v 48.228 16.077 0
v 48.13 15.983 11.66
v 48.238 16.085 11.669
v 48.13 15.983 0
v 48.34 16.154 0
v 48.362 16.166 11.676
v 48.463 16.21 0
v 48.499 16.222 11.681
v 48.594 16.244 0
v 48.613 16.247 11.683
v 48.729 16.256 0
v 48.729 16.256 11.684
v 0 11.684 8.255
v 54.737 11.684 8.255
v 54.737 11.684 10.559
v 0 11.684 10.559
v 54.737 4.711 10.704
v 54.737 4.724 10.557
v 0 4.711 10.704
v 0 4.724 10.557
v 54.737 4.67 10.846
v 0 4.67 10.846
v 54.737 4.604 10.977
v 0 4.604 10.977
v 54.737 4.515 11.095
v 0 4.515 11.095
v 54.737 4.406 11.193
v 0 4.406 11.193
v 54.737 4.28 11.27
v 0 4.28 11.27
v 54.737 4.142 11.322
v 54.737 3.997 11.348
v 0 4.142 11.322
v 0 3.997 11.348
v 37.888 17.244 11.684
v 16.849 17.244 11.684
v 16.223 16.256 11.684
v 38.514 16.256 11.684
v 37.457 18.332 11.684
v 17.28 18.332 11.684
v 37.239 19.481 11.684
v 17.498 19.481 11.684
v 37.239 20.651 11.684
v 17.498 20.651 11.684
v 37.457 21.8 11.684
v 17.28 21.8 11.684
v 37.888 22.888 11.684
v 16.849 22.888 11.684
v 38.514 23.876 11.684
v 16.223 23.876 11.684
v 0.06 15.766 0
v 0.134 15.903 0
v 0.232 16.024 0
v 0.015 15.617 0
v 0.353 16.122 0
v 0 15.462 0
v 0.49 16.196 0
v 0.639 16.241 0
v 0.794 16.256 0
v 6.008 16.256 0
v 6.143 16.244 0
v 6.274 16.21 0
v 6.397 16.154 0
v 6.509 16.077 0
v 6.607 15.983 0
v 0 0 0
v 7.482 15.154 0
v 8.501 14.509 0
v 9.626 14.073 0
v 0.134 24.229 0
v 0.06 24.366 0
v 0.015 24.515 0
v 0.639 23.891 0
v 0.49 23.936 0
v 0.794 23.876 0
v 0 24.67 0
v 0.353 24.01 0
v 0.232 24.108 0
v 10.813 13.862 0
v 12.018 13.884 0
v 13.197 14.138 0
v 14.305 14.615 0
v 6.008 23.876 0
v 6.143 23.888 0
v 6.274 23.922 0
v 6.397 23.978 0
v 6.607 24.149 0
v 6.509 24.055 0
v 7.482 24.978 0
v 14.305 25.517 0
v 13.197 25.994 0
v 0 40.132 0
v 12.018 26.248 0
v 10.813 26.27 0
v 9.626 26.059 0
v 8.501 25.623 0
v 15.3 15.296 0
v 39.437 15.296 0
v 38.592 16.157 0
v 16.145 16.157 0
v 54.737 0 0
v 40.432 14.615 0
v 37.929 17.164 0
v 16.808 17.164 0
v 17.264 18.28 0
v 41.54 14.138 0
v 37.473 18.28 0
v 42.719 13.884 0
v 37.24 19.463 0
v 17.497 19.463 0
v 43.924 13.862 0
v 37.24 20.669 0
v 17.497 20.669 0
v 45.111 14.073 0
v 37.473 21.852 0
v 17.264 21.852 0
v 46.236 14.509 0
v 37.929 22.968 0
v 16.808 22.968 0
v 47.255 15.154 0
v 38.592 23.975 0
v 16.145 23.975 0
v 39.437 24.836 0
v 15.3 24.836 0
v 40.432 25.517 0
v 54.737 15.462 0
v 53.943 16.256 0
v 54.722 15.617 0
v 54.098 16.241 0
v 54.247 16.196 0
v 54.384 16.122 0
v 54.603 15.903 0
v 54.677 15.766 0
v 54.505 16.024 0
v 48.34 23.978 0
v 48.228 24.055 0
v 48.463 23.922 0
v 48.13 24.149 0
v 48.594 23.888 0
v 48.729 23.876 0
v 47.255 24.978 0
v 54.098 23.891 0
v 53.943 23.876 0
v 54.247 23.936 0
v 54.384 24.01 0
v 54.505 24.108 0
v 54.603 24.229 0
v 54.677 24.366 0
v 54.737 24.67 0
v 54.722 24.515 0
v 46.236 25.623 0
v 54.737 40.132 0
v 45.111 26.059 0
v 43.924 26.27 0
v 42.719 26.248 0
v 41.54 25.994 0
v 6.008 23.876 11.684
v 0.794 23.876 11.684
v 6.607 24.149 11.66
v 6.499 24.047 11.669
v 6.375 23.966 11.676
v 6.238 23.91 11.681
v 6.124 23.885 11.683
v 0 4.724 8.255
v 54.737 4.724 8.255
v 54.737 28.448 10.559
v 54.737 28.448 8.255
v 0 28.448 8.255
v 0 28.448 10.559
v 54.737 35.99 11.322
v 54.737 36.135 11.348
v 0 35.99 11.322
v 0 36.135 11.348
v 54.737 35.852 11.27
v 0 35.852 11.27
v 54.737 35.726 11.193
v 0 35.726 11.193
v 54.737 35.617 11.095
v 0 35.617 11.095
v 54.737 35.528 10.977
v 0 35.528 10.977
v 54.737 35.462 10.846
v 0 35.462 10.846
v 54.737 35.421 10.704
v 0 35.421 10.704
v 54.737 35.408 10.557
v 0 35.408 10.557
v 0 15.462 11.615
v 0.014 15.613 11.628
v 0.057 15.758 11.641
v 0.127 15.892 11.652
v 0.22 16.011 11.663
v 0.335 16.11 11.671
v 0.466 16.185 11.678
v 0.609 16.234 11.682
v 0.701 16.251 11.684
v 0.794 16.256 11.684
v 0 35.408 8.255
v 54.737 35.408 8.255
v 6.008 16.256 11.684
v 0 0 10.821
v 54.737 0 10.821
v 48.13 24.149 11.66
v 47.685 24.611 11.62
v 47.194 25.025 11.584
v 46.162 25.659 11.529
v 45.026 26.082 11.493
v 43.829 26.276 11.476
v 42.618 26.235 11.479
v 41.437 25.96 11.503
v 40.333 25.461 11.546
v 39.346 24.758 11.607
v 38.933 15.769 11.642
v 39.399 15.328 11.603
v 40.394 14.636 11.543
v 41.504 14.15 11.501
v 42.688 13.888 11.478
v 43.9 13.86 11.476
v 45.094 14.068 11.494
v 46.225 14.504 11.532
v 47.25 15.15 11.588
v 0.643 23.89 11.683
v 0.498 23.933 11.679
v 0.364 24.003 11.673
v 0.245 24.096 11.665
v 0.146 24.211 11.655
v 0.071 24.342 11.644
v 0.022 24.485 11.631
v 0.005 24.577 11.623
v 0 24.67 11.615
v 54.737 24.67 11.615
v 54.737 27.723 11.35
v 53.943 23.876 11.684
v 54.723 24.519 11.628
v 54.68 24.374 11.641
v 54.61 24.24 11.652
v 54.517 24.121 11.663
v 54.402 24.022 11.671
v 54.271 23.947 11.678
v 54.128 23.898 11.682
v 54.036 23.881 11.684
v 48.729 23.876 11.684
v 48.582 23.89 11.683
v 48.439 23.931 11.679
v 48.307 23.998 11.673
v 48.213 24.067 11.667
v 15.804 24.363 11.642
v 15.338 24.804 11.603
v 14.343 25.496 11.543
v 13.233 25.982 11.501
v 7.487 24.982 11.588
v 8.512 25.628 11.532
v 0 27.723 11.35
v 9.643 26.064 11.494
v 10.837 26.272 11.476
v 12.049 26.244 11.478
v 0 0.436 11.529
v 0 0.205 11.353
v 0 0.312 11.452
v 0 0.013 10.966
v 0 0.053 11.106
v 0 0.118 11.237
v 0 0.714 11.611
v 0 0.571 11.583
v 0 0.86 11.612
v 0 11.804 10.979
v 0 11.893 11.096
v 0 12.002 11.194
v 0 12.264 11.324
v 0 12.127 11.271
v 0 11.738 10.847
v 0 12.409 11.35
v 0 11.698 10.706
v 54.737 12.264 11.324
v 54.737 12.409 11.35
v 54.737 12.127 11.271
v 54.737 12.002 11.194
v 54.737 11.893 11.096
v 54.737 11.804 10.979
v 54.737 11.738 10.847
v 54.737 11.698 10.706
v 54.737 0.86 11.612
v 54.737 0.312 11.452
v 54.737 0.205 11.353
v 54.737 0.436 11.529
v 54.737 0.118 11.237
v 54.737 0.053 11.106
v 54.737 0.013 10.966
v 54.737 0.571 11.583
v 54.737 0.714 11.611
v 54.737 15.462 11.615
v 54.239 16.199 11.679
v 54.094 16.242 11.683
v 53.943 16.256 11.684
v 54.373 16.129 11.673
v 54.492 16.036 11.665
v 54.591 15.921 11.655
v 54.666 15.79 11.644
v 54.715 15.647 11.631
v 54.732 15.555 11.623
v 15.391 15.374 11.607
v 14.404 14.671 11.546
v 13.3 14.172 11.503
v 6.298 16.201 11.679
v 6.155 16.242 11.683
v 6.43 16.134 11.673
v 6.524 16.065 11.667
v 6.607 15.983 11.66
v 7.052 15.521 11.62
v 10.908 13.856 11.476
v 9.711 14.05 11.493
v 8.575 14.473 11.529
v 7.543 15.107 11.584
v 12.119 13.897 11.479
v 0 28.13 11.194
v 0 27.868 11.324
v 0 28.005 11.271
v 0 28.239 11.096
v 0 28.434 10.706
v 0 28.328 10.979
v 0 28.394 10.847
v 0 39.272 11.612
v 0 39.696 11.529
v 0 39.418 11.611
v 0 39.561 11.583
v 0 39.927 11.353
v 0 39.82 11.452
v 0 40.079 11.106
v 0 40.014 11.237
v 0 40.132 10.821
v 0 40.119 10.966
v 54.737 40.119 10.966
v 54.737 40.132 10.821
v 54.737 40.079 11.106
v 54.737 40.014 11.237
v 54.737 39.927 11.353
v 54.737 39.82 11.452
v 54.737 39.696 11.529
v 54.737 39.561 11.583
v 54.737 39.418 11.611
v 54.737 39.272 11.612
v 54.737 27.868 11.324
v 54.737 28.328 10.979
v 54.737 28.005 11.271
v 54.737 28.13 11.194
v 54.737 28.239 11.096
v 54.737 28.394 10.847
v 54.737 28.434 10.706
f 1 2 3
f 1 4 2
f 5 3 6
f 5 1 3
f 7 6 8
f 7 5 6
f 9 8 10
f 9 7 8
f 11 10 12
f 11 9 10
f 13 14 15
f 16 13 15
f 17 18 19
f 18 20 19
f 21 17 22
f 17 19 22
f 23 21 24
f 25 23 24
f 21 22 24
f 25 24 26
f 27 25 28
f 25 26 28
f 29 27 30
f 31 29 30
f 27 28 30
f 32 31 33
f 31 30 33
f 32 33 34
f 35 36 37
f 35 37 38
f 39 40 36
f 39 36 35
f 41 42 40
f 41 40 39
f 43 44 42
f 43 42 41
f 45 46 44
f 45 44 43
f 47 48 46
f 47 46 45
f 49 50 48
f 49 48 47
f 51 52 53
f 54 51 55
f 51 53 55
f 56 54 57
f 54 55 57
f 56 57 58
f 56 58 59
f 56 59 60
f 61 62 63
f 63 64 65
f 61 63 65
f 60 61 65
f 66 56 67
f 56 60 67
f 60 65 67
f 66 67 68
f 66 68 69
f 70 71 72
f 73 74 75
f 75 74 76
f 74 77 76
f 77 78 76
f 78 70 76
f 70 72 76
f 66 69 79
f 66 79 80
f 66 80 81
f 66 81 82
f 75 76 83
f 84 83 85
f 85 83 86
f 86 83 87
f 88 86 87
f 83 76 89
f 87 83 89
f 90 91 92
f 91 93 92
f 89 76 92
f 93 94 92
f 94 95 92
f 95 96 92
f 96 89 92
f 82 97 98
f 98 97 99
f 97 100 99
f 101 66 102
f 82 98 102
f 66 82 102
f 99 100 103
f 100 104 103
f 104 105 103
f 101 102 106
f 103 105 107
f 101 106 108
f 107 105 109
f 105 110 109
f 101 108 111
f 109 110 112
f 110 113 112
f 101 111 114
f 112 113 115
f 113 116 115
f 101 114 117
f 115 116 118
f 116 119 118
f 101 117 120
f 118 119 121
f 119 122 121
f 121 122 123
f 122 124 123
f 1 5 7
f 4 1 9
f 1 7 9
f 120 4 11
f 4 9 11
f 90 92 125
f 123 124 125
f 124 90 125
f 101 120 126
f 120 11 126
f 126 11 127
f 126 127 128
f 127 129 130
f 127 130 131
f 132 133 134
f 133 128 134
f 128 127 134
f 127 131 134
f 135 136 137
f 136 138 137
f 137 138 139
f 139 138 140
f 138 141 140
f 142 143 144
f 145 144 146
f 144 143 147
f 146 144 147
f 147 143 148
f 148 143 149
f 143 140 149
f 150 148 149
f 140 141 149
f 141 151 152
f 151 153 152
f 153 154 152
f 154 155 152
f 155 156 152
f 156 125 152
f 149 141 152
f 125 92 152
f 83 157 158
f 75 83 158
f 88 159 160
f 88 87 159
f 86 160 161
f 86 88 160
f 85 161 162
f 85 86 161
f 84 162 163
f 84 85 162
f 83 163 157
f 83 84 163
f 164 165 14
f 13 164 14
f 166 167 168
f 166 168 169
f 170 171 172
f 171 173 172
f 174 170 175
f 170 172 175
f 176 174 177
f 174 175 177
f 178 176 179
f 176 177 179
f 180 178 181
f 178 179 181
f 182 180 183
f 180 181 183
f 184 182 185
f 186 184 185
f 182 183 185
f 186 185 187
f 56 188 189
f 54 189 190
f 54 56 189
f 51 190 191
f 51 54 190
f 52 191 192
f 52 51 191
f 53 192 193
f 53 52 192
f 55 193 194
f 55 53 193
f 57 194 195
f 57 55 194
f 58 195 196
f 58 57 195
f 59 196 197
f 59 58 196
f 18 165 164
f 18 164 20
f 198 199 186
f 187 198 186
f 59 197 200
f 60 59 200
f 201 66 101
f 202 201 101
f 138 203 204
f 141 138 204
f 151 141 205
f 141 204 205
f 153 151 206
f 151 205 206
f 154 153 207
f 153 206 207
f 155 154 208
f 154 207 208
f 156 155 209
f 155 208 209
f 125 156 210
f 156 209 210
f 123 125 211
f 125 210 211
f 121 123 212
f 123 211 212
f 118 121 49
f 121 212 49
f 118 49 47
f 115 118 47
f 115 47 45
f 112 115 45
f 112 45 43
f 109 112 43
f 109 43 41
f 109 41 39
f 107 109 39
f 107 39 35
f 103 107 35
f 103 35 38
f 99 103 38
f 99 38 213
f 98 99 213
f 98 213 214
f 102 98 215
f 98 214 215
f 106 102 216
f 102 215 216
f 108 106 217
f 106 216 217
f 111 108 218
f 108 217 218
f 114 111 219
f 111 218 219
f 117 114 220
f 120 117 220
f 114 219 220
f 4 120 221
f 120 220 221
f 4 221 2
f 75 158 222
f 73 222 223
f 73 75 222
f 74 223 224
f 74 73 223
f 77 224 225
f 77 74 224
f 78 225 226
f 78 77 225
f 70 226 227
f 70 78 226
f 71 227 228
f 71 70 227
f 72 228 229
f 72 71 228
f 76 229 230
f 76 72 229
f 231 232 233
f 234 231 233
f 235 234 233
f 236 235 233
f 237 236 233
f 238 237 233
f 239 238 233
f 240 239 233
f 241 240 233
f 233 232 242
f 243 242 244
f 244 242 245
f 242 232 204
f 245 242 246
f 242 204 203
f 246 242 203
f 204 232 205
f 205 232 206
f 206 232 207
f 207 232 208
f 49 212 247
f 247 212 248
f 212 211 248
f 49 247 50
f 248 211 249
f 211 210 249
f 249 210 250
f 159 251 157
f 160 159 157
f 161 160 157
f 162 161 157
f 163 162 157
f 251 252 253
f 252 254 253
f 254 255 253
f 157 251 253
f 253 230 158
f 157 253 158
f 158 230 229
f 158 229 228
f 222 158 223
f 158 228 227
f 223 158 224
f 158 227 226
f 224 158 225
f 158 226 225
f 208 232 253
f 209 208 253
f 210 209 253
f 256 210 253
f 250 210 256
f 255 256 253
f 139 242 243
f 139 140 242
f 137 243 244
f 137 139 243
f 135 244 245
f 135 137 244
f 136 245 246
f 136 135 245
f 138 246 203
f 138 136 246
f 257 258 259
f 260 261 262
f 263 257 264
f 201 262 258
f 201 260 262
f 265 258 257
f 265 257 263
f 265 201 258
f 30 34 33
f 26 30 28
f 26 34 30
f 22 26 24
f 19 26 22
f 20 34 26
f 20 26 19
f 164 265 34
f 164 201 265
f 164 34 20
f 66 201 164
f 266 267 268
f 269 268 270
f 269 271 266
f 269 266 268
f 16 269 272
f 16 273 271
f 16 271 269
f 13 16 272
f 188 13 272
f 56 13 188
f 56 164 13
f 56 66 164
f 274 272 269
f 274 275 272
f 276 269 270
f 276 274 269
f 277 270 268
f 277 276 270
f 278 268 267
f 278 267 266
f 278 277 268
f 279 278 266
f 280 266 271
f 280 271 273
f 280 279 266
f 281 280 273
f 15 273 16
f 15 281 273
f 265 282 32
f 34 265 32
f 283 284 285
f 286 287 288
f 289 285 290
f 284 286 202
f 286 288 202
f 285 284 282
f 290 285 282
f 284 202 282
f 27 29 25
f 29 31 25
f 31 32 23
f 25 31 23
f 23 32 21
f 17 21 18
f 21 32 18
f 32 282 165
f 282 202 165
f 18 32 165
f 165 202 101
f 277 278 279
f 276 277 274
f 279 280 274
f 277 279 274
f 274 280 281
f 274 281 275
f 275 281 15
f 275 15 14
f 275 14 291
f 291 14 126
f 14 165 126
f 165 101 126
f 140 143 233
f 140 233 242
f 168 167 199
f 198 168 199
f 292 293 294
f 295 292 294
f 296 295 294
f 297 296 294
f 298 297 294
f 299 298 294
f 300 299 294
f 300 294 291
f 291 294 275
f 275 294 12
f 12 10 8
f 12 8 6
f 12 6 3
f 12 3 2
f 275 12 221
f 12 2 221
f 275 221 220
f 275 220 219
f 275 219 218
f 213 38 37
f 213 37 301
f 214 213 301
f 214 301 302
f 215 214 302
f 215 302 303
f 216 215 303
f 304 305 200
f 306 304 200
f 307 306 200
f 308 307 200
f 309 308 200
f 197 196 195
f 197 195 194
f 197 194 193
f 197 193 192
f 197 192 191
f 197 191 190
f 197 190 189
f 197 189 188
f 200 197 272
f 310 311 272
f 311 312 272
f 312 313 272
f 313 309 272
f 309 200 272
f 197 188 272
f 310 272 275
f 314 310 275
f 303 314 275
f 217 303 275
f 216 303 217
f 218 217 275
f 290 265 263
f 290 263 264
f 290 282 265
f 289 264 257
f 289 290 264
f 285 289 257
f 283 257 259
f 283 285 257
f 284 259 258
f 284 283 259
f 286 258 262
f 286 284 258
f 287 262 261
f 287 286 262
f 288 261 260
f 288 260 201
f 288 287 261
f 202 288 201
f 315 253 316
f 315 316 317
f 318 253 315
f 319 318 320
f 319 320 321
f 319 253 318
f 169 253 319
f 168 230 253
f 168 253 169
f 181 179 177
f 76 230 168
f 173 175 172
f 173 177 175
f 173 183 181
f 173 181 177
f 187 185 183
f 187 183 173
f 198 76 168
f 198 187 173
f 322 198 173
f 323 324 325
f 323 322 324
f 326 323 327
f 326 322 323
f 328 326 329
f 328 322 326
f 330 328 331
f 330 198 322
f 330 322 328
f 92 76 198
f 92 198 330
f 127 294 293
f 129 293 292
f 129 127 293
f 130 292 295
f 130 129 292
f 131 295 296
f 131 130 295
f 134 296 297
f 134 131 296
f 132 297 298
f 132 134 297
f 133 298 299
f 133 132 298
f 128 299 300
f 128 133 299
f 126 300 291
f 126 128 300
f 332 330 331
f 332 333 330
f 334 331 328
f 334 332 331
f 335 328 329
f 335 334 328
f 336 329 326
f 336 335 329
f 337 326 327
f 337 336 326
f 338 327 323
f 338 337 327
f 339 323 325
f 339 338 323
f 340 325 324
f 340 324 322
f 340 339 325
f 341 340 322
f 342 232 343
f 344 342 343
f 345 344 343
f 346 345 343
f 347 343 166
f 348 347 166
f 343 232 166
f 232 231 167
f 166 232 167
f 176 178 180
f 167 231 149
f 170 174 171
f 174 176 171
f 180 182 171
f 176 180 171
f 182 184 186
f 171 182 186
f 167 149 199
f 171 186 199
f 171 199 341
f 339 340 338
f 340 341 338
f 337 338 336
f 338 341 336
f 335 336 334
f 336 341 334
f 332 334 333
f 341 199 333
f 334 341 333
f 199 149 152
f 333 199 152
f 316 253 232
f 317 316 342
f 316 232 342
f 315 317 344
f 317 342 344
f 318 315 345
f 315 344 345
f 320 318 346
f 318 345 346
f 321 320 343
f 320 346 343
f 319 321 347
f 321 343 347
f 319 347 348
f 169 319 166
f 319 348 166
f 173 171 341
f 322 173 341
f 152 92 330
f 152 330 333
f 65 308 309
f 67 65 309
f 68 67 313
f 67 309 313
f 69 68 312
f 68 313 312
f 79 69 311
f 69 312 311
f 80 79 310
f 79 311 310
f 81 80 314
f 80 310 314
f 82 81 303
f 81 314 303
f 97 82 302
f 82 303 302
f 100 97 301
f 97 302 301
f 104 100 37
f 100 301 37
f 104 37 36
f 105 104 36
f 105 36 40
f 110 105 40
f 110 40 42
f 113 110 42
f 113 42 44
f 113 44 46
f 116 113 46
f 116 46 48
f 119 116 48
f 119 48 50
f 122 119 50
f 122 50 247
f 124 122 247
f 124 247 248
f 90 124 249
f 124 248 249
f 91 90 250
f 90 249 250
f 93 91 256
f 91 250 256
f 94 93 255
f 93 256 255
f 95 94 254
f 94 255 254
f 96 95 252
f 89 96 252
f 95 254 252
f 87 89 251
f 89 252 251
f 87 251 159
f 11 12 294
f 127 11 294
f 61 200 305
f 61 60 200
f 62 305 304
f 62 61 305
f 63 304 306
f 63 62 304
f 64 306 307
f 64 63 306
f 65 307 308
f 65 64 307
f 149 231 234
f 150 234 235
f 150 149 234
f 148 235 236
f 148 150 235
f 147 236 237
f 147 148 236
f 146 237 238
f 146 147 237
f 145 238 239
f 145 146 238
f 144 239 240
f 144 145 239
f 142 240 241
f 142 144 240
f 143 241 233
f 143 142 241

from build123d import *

# Parameters (mm, degrees)
F0_W     = 54.737
F0_H     = 40.132
F1_DEPTH = 11.684
F2_W     = 6.9596
F2_H     = 3.429
F3_DEPTH = 54.738
F5_DEPTH = 54.738
F7_DEPTH = 11.685
F9_DEPTH = 54.738
F10_R    = 0.79375


with BuildPart() as f1:
    # F0 (on Top) → F1 (new body)
    with BuildSketch(Plane.XY):
        with Locations((27.3685, 20.066)):
            Rectangle(F0_W, F0_H)
    extrude(amount=F1_DEPTH)

    # F2 (on face) → F3 (cut, through all)
    with BuildSketch(Plane.YZ.offset(54.737)):
        with Locations((31.9278, 9.9695)):
            Rectangle(F2_W, F2_H)
        with Locations((8.2042, 9.9695)):
            Rectangle(F2_W, F2_H)
    extrude(amount=-F3_DEPTH, mode=Mode.SUBTRACT)

    # F4 (on face) → F5 (cut, through all)
    with BuildSketch(Plane.YZ.offset(54.737)):
        Polygon((4.7244, 11.684), (0, 11.684), (4.7244, 11.287125), align=None)
        Polygon((35.4076, 11.287125), (40.132, 11.684), (35.4076, 11.684), align=None)
    extrude(amount=-F5_DEPTH, mode=Mode.SUBTRACT)

    # F6 (on face) → F7 (cut, through all)
    with BuildSketch(Plane.XY.offset(11.684)):
        with BuildLine():
            Line((0, 16.256), (6.3826718605, 16.256))
            ThreePointArc((6.3826718605, 16.256), (17.526, 20.066), (6.3826718605, 23.876))
            Line((6.3826718605, 23.876), (0, 23.876))
            Line((0, 23.876), (0, 16.256))
        make_face()
        with BuildLine():
            Line((54.737, 23.876), (48.3543281395, 23.876))
            ThreePointArc((48.3543281395, 23.876), (37.211, 20.066), (48.3543281395, 16.256))
            Line((48.3543281395, 16.256), (54.737, 16.256))
            Line((54.737, 16.256), (54.737, 23.876))
        make_face()
    extrude(amount=-F7_DEPTH, mode=Mode.SUBTRACT)

    # F8 (on face) → F9 (cut, through all)
    with BuildSketch(Plane(origin=(0, 0, 0), x_dir=(0, -1, 0), z_dir=(-1, 0, 0))):
        Polygon((-28.448, 11.287125), (-23.876, 11.684), (-28.448, 11.684), align=None)
        Polygon((-16.256, 11.684), (-11.684, 11.287125), (-11.684, 11.684), align=None)
    extrude(amount=-F9_DEPTH, mode=Mode.SUBTRACT)

    # F10
    f10_edges = [f1.edges().sort_by_distance(p)[0] for p in [
        (27.3685, 40.132, 11.684),
        (27.3685, 35.4076, 11.287125),
        (27.3685, 28.448, 11.287125),
        (27.3685, 11.684, 11.287125),
        (27.3685, 4.7244, 11.287125),
        (27.3685, 0, 11.684),
        (54.737, 16.256, 5.842),
        (54.737, 23.876, 5.842),
        (0, 23.876, 5.842),
        (0, 16.256, 5.842),
        (6.382672, 23.876, 5.842),
        (6.382672, 16.256, 5.842),
        (48.354328, 16.256, 5.842),
        (48.354328, 23.876, 5.842),
    ]]
    fillet(f10_edges, radius=F10_R)


solid = f1.part
